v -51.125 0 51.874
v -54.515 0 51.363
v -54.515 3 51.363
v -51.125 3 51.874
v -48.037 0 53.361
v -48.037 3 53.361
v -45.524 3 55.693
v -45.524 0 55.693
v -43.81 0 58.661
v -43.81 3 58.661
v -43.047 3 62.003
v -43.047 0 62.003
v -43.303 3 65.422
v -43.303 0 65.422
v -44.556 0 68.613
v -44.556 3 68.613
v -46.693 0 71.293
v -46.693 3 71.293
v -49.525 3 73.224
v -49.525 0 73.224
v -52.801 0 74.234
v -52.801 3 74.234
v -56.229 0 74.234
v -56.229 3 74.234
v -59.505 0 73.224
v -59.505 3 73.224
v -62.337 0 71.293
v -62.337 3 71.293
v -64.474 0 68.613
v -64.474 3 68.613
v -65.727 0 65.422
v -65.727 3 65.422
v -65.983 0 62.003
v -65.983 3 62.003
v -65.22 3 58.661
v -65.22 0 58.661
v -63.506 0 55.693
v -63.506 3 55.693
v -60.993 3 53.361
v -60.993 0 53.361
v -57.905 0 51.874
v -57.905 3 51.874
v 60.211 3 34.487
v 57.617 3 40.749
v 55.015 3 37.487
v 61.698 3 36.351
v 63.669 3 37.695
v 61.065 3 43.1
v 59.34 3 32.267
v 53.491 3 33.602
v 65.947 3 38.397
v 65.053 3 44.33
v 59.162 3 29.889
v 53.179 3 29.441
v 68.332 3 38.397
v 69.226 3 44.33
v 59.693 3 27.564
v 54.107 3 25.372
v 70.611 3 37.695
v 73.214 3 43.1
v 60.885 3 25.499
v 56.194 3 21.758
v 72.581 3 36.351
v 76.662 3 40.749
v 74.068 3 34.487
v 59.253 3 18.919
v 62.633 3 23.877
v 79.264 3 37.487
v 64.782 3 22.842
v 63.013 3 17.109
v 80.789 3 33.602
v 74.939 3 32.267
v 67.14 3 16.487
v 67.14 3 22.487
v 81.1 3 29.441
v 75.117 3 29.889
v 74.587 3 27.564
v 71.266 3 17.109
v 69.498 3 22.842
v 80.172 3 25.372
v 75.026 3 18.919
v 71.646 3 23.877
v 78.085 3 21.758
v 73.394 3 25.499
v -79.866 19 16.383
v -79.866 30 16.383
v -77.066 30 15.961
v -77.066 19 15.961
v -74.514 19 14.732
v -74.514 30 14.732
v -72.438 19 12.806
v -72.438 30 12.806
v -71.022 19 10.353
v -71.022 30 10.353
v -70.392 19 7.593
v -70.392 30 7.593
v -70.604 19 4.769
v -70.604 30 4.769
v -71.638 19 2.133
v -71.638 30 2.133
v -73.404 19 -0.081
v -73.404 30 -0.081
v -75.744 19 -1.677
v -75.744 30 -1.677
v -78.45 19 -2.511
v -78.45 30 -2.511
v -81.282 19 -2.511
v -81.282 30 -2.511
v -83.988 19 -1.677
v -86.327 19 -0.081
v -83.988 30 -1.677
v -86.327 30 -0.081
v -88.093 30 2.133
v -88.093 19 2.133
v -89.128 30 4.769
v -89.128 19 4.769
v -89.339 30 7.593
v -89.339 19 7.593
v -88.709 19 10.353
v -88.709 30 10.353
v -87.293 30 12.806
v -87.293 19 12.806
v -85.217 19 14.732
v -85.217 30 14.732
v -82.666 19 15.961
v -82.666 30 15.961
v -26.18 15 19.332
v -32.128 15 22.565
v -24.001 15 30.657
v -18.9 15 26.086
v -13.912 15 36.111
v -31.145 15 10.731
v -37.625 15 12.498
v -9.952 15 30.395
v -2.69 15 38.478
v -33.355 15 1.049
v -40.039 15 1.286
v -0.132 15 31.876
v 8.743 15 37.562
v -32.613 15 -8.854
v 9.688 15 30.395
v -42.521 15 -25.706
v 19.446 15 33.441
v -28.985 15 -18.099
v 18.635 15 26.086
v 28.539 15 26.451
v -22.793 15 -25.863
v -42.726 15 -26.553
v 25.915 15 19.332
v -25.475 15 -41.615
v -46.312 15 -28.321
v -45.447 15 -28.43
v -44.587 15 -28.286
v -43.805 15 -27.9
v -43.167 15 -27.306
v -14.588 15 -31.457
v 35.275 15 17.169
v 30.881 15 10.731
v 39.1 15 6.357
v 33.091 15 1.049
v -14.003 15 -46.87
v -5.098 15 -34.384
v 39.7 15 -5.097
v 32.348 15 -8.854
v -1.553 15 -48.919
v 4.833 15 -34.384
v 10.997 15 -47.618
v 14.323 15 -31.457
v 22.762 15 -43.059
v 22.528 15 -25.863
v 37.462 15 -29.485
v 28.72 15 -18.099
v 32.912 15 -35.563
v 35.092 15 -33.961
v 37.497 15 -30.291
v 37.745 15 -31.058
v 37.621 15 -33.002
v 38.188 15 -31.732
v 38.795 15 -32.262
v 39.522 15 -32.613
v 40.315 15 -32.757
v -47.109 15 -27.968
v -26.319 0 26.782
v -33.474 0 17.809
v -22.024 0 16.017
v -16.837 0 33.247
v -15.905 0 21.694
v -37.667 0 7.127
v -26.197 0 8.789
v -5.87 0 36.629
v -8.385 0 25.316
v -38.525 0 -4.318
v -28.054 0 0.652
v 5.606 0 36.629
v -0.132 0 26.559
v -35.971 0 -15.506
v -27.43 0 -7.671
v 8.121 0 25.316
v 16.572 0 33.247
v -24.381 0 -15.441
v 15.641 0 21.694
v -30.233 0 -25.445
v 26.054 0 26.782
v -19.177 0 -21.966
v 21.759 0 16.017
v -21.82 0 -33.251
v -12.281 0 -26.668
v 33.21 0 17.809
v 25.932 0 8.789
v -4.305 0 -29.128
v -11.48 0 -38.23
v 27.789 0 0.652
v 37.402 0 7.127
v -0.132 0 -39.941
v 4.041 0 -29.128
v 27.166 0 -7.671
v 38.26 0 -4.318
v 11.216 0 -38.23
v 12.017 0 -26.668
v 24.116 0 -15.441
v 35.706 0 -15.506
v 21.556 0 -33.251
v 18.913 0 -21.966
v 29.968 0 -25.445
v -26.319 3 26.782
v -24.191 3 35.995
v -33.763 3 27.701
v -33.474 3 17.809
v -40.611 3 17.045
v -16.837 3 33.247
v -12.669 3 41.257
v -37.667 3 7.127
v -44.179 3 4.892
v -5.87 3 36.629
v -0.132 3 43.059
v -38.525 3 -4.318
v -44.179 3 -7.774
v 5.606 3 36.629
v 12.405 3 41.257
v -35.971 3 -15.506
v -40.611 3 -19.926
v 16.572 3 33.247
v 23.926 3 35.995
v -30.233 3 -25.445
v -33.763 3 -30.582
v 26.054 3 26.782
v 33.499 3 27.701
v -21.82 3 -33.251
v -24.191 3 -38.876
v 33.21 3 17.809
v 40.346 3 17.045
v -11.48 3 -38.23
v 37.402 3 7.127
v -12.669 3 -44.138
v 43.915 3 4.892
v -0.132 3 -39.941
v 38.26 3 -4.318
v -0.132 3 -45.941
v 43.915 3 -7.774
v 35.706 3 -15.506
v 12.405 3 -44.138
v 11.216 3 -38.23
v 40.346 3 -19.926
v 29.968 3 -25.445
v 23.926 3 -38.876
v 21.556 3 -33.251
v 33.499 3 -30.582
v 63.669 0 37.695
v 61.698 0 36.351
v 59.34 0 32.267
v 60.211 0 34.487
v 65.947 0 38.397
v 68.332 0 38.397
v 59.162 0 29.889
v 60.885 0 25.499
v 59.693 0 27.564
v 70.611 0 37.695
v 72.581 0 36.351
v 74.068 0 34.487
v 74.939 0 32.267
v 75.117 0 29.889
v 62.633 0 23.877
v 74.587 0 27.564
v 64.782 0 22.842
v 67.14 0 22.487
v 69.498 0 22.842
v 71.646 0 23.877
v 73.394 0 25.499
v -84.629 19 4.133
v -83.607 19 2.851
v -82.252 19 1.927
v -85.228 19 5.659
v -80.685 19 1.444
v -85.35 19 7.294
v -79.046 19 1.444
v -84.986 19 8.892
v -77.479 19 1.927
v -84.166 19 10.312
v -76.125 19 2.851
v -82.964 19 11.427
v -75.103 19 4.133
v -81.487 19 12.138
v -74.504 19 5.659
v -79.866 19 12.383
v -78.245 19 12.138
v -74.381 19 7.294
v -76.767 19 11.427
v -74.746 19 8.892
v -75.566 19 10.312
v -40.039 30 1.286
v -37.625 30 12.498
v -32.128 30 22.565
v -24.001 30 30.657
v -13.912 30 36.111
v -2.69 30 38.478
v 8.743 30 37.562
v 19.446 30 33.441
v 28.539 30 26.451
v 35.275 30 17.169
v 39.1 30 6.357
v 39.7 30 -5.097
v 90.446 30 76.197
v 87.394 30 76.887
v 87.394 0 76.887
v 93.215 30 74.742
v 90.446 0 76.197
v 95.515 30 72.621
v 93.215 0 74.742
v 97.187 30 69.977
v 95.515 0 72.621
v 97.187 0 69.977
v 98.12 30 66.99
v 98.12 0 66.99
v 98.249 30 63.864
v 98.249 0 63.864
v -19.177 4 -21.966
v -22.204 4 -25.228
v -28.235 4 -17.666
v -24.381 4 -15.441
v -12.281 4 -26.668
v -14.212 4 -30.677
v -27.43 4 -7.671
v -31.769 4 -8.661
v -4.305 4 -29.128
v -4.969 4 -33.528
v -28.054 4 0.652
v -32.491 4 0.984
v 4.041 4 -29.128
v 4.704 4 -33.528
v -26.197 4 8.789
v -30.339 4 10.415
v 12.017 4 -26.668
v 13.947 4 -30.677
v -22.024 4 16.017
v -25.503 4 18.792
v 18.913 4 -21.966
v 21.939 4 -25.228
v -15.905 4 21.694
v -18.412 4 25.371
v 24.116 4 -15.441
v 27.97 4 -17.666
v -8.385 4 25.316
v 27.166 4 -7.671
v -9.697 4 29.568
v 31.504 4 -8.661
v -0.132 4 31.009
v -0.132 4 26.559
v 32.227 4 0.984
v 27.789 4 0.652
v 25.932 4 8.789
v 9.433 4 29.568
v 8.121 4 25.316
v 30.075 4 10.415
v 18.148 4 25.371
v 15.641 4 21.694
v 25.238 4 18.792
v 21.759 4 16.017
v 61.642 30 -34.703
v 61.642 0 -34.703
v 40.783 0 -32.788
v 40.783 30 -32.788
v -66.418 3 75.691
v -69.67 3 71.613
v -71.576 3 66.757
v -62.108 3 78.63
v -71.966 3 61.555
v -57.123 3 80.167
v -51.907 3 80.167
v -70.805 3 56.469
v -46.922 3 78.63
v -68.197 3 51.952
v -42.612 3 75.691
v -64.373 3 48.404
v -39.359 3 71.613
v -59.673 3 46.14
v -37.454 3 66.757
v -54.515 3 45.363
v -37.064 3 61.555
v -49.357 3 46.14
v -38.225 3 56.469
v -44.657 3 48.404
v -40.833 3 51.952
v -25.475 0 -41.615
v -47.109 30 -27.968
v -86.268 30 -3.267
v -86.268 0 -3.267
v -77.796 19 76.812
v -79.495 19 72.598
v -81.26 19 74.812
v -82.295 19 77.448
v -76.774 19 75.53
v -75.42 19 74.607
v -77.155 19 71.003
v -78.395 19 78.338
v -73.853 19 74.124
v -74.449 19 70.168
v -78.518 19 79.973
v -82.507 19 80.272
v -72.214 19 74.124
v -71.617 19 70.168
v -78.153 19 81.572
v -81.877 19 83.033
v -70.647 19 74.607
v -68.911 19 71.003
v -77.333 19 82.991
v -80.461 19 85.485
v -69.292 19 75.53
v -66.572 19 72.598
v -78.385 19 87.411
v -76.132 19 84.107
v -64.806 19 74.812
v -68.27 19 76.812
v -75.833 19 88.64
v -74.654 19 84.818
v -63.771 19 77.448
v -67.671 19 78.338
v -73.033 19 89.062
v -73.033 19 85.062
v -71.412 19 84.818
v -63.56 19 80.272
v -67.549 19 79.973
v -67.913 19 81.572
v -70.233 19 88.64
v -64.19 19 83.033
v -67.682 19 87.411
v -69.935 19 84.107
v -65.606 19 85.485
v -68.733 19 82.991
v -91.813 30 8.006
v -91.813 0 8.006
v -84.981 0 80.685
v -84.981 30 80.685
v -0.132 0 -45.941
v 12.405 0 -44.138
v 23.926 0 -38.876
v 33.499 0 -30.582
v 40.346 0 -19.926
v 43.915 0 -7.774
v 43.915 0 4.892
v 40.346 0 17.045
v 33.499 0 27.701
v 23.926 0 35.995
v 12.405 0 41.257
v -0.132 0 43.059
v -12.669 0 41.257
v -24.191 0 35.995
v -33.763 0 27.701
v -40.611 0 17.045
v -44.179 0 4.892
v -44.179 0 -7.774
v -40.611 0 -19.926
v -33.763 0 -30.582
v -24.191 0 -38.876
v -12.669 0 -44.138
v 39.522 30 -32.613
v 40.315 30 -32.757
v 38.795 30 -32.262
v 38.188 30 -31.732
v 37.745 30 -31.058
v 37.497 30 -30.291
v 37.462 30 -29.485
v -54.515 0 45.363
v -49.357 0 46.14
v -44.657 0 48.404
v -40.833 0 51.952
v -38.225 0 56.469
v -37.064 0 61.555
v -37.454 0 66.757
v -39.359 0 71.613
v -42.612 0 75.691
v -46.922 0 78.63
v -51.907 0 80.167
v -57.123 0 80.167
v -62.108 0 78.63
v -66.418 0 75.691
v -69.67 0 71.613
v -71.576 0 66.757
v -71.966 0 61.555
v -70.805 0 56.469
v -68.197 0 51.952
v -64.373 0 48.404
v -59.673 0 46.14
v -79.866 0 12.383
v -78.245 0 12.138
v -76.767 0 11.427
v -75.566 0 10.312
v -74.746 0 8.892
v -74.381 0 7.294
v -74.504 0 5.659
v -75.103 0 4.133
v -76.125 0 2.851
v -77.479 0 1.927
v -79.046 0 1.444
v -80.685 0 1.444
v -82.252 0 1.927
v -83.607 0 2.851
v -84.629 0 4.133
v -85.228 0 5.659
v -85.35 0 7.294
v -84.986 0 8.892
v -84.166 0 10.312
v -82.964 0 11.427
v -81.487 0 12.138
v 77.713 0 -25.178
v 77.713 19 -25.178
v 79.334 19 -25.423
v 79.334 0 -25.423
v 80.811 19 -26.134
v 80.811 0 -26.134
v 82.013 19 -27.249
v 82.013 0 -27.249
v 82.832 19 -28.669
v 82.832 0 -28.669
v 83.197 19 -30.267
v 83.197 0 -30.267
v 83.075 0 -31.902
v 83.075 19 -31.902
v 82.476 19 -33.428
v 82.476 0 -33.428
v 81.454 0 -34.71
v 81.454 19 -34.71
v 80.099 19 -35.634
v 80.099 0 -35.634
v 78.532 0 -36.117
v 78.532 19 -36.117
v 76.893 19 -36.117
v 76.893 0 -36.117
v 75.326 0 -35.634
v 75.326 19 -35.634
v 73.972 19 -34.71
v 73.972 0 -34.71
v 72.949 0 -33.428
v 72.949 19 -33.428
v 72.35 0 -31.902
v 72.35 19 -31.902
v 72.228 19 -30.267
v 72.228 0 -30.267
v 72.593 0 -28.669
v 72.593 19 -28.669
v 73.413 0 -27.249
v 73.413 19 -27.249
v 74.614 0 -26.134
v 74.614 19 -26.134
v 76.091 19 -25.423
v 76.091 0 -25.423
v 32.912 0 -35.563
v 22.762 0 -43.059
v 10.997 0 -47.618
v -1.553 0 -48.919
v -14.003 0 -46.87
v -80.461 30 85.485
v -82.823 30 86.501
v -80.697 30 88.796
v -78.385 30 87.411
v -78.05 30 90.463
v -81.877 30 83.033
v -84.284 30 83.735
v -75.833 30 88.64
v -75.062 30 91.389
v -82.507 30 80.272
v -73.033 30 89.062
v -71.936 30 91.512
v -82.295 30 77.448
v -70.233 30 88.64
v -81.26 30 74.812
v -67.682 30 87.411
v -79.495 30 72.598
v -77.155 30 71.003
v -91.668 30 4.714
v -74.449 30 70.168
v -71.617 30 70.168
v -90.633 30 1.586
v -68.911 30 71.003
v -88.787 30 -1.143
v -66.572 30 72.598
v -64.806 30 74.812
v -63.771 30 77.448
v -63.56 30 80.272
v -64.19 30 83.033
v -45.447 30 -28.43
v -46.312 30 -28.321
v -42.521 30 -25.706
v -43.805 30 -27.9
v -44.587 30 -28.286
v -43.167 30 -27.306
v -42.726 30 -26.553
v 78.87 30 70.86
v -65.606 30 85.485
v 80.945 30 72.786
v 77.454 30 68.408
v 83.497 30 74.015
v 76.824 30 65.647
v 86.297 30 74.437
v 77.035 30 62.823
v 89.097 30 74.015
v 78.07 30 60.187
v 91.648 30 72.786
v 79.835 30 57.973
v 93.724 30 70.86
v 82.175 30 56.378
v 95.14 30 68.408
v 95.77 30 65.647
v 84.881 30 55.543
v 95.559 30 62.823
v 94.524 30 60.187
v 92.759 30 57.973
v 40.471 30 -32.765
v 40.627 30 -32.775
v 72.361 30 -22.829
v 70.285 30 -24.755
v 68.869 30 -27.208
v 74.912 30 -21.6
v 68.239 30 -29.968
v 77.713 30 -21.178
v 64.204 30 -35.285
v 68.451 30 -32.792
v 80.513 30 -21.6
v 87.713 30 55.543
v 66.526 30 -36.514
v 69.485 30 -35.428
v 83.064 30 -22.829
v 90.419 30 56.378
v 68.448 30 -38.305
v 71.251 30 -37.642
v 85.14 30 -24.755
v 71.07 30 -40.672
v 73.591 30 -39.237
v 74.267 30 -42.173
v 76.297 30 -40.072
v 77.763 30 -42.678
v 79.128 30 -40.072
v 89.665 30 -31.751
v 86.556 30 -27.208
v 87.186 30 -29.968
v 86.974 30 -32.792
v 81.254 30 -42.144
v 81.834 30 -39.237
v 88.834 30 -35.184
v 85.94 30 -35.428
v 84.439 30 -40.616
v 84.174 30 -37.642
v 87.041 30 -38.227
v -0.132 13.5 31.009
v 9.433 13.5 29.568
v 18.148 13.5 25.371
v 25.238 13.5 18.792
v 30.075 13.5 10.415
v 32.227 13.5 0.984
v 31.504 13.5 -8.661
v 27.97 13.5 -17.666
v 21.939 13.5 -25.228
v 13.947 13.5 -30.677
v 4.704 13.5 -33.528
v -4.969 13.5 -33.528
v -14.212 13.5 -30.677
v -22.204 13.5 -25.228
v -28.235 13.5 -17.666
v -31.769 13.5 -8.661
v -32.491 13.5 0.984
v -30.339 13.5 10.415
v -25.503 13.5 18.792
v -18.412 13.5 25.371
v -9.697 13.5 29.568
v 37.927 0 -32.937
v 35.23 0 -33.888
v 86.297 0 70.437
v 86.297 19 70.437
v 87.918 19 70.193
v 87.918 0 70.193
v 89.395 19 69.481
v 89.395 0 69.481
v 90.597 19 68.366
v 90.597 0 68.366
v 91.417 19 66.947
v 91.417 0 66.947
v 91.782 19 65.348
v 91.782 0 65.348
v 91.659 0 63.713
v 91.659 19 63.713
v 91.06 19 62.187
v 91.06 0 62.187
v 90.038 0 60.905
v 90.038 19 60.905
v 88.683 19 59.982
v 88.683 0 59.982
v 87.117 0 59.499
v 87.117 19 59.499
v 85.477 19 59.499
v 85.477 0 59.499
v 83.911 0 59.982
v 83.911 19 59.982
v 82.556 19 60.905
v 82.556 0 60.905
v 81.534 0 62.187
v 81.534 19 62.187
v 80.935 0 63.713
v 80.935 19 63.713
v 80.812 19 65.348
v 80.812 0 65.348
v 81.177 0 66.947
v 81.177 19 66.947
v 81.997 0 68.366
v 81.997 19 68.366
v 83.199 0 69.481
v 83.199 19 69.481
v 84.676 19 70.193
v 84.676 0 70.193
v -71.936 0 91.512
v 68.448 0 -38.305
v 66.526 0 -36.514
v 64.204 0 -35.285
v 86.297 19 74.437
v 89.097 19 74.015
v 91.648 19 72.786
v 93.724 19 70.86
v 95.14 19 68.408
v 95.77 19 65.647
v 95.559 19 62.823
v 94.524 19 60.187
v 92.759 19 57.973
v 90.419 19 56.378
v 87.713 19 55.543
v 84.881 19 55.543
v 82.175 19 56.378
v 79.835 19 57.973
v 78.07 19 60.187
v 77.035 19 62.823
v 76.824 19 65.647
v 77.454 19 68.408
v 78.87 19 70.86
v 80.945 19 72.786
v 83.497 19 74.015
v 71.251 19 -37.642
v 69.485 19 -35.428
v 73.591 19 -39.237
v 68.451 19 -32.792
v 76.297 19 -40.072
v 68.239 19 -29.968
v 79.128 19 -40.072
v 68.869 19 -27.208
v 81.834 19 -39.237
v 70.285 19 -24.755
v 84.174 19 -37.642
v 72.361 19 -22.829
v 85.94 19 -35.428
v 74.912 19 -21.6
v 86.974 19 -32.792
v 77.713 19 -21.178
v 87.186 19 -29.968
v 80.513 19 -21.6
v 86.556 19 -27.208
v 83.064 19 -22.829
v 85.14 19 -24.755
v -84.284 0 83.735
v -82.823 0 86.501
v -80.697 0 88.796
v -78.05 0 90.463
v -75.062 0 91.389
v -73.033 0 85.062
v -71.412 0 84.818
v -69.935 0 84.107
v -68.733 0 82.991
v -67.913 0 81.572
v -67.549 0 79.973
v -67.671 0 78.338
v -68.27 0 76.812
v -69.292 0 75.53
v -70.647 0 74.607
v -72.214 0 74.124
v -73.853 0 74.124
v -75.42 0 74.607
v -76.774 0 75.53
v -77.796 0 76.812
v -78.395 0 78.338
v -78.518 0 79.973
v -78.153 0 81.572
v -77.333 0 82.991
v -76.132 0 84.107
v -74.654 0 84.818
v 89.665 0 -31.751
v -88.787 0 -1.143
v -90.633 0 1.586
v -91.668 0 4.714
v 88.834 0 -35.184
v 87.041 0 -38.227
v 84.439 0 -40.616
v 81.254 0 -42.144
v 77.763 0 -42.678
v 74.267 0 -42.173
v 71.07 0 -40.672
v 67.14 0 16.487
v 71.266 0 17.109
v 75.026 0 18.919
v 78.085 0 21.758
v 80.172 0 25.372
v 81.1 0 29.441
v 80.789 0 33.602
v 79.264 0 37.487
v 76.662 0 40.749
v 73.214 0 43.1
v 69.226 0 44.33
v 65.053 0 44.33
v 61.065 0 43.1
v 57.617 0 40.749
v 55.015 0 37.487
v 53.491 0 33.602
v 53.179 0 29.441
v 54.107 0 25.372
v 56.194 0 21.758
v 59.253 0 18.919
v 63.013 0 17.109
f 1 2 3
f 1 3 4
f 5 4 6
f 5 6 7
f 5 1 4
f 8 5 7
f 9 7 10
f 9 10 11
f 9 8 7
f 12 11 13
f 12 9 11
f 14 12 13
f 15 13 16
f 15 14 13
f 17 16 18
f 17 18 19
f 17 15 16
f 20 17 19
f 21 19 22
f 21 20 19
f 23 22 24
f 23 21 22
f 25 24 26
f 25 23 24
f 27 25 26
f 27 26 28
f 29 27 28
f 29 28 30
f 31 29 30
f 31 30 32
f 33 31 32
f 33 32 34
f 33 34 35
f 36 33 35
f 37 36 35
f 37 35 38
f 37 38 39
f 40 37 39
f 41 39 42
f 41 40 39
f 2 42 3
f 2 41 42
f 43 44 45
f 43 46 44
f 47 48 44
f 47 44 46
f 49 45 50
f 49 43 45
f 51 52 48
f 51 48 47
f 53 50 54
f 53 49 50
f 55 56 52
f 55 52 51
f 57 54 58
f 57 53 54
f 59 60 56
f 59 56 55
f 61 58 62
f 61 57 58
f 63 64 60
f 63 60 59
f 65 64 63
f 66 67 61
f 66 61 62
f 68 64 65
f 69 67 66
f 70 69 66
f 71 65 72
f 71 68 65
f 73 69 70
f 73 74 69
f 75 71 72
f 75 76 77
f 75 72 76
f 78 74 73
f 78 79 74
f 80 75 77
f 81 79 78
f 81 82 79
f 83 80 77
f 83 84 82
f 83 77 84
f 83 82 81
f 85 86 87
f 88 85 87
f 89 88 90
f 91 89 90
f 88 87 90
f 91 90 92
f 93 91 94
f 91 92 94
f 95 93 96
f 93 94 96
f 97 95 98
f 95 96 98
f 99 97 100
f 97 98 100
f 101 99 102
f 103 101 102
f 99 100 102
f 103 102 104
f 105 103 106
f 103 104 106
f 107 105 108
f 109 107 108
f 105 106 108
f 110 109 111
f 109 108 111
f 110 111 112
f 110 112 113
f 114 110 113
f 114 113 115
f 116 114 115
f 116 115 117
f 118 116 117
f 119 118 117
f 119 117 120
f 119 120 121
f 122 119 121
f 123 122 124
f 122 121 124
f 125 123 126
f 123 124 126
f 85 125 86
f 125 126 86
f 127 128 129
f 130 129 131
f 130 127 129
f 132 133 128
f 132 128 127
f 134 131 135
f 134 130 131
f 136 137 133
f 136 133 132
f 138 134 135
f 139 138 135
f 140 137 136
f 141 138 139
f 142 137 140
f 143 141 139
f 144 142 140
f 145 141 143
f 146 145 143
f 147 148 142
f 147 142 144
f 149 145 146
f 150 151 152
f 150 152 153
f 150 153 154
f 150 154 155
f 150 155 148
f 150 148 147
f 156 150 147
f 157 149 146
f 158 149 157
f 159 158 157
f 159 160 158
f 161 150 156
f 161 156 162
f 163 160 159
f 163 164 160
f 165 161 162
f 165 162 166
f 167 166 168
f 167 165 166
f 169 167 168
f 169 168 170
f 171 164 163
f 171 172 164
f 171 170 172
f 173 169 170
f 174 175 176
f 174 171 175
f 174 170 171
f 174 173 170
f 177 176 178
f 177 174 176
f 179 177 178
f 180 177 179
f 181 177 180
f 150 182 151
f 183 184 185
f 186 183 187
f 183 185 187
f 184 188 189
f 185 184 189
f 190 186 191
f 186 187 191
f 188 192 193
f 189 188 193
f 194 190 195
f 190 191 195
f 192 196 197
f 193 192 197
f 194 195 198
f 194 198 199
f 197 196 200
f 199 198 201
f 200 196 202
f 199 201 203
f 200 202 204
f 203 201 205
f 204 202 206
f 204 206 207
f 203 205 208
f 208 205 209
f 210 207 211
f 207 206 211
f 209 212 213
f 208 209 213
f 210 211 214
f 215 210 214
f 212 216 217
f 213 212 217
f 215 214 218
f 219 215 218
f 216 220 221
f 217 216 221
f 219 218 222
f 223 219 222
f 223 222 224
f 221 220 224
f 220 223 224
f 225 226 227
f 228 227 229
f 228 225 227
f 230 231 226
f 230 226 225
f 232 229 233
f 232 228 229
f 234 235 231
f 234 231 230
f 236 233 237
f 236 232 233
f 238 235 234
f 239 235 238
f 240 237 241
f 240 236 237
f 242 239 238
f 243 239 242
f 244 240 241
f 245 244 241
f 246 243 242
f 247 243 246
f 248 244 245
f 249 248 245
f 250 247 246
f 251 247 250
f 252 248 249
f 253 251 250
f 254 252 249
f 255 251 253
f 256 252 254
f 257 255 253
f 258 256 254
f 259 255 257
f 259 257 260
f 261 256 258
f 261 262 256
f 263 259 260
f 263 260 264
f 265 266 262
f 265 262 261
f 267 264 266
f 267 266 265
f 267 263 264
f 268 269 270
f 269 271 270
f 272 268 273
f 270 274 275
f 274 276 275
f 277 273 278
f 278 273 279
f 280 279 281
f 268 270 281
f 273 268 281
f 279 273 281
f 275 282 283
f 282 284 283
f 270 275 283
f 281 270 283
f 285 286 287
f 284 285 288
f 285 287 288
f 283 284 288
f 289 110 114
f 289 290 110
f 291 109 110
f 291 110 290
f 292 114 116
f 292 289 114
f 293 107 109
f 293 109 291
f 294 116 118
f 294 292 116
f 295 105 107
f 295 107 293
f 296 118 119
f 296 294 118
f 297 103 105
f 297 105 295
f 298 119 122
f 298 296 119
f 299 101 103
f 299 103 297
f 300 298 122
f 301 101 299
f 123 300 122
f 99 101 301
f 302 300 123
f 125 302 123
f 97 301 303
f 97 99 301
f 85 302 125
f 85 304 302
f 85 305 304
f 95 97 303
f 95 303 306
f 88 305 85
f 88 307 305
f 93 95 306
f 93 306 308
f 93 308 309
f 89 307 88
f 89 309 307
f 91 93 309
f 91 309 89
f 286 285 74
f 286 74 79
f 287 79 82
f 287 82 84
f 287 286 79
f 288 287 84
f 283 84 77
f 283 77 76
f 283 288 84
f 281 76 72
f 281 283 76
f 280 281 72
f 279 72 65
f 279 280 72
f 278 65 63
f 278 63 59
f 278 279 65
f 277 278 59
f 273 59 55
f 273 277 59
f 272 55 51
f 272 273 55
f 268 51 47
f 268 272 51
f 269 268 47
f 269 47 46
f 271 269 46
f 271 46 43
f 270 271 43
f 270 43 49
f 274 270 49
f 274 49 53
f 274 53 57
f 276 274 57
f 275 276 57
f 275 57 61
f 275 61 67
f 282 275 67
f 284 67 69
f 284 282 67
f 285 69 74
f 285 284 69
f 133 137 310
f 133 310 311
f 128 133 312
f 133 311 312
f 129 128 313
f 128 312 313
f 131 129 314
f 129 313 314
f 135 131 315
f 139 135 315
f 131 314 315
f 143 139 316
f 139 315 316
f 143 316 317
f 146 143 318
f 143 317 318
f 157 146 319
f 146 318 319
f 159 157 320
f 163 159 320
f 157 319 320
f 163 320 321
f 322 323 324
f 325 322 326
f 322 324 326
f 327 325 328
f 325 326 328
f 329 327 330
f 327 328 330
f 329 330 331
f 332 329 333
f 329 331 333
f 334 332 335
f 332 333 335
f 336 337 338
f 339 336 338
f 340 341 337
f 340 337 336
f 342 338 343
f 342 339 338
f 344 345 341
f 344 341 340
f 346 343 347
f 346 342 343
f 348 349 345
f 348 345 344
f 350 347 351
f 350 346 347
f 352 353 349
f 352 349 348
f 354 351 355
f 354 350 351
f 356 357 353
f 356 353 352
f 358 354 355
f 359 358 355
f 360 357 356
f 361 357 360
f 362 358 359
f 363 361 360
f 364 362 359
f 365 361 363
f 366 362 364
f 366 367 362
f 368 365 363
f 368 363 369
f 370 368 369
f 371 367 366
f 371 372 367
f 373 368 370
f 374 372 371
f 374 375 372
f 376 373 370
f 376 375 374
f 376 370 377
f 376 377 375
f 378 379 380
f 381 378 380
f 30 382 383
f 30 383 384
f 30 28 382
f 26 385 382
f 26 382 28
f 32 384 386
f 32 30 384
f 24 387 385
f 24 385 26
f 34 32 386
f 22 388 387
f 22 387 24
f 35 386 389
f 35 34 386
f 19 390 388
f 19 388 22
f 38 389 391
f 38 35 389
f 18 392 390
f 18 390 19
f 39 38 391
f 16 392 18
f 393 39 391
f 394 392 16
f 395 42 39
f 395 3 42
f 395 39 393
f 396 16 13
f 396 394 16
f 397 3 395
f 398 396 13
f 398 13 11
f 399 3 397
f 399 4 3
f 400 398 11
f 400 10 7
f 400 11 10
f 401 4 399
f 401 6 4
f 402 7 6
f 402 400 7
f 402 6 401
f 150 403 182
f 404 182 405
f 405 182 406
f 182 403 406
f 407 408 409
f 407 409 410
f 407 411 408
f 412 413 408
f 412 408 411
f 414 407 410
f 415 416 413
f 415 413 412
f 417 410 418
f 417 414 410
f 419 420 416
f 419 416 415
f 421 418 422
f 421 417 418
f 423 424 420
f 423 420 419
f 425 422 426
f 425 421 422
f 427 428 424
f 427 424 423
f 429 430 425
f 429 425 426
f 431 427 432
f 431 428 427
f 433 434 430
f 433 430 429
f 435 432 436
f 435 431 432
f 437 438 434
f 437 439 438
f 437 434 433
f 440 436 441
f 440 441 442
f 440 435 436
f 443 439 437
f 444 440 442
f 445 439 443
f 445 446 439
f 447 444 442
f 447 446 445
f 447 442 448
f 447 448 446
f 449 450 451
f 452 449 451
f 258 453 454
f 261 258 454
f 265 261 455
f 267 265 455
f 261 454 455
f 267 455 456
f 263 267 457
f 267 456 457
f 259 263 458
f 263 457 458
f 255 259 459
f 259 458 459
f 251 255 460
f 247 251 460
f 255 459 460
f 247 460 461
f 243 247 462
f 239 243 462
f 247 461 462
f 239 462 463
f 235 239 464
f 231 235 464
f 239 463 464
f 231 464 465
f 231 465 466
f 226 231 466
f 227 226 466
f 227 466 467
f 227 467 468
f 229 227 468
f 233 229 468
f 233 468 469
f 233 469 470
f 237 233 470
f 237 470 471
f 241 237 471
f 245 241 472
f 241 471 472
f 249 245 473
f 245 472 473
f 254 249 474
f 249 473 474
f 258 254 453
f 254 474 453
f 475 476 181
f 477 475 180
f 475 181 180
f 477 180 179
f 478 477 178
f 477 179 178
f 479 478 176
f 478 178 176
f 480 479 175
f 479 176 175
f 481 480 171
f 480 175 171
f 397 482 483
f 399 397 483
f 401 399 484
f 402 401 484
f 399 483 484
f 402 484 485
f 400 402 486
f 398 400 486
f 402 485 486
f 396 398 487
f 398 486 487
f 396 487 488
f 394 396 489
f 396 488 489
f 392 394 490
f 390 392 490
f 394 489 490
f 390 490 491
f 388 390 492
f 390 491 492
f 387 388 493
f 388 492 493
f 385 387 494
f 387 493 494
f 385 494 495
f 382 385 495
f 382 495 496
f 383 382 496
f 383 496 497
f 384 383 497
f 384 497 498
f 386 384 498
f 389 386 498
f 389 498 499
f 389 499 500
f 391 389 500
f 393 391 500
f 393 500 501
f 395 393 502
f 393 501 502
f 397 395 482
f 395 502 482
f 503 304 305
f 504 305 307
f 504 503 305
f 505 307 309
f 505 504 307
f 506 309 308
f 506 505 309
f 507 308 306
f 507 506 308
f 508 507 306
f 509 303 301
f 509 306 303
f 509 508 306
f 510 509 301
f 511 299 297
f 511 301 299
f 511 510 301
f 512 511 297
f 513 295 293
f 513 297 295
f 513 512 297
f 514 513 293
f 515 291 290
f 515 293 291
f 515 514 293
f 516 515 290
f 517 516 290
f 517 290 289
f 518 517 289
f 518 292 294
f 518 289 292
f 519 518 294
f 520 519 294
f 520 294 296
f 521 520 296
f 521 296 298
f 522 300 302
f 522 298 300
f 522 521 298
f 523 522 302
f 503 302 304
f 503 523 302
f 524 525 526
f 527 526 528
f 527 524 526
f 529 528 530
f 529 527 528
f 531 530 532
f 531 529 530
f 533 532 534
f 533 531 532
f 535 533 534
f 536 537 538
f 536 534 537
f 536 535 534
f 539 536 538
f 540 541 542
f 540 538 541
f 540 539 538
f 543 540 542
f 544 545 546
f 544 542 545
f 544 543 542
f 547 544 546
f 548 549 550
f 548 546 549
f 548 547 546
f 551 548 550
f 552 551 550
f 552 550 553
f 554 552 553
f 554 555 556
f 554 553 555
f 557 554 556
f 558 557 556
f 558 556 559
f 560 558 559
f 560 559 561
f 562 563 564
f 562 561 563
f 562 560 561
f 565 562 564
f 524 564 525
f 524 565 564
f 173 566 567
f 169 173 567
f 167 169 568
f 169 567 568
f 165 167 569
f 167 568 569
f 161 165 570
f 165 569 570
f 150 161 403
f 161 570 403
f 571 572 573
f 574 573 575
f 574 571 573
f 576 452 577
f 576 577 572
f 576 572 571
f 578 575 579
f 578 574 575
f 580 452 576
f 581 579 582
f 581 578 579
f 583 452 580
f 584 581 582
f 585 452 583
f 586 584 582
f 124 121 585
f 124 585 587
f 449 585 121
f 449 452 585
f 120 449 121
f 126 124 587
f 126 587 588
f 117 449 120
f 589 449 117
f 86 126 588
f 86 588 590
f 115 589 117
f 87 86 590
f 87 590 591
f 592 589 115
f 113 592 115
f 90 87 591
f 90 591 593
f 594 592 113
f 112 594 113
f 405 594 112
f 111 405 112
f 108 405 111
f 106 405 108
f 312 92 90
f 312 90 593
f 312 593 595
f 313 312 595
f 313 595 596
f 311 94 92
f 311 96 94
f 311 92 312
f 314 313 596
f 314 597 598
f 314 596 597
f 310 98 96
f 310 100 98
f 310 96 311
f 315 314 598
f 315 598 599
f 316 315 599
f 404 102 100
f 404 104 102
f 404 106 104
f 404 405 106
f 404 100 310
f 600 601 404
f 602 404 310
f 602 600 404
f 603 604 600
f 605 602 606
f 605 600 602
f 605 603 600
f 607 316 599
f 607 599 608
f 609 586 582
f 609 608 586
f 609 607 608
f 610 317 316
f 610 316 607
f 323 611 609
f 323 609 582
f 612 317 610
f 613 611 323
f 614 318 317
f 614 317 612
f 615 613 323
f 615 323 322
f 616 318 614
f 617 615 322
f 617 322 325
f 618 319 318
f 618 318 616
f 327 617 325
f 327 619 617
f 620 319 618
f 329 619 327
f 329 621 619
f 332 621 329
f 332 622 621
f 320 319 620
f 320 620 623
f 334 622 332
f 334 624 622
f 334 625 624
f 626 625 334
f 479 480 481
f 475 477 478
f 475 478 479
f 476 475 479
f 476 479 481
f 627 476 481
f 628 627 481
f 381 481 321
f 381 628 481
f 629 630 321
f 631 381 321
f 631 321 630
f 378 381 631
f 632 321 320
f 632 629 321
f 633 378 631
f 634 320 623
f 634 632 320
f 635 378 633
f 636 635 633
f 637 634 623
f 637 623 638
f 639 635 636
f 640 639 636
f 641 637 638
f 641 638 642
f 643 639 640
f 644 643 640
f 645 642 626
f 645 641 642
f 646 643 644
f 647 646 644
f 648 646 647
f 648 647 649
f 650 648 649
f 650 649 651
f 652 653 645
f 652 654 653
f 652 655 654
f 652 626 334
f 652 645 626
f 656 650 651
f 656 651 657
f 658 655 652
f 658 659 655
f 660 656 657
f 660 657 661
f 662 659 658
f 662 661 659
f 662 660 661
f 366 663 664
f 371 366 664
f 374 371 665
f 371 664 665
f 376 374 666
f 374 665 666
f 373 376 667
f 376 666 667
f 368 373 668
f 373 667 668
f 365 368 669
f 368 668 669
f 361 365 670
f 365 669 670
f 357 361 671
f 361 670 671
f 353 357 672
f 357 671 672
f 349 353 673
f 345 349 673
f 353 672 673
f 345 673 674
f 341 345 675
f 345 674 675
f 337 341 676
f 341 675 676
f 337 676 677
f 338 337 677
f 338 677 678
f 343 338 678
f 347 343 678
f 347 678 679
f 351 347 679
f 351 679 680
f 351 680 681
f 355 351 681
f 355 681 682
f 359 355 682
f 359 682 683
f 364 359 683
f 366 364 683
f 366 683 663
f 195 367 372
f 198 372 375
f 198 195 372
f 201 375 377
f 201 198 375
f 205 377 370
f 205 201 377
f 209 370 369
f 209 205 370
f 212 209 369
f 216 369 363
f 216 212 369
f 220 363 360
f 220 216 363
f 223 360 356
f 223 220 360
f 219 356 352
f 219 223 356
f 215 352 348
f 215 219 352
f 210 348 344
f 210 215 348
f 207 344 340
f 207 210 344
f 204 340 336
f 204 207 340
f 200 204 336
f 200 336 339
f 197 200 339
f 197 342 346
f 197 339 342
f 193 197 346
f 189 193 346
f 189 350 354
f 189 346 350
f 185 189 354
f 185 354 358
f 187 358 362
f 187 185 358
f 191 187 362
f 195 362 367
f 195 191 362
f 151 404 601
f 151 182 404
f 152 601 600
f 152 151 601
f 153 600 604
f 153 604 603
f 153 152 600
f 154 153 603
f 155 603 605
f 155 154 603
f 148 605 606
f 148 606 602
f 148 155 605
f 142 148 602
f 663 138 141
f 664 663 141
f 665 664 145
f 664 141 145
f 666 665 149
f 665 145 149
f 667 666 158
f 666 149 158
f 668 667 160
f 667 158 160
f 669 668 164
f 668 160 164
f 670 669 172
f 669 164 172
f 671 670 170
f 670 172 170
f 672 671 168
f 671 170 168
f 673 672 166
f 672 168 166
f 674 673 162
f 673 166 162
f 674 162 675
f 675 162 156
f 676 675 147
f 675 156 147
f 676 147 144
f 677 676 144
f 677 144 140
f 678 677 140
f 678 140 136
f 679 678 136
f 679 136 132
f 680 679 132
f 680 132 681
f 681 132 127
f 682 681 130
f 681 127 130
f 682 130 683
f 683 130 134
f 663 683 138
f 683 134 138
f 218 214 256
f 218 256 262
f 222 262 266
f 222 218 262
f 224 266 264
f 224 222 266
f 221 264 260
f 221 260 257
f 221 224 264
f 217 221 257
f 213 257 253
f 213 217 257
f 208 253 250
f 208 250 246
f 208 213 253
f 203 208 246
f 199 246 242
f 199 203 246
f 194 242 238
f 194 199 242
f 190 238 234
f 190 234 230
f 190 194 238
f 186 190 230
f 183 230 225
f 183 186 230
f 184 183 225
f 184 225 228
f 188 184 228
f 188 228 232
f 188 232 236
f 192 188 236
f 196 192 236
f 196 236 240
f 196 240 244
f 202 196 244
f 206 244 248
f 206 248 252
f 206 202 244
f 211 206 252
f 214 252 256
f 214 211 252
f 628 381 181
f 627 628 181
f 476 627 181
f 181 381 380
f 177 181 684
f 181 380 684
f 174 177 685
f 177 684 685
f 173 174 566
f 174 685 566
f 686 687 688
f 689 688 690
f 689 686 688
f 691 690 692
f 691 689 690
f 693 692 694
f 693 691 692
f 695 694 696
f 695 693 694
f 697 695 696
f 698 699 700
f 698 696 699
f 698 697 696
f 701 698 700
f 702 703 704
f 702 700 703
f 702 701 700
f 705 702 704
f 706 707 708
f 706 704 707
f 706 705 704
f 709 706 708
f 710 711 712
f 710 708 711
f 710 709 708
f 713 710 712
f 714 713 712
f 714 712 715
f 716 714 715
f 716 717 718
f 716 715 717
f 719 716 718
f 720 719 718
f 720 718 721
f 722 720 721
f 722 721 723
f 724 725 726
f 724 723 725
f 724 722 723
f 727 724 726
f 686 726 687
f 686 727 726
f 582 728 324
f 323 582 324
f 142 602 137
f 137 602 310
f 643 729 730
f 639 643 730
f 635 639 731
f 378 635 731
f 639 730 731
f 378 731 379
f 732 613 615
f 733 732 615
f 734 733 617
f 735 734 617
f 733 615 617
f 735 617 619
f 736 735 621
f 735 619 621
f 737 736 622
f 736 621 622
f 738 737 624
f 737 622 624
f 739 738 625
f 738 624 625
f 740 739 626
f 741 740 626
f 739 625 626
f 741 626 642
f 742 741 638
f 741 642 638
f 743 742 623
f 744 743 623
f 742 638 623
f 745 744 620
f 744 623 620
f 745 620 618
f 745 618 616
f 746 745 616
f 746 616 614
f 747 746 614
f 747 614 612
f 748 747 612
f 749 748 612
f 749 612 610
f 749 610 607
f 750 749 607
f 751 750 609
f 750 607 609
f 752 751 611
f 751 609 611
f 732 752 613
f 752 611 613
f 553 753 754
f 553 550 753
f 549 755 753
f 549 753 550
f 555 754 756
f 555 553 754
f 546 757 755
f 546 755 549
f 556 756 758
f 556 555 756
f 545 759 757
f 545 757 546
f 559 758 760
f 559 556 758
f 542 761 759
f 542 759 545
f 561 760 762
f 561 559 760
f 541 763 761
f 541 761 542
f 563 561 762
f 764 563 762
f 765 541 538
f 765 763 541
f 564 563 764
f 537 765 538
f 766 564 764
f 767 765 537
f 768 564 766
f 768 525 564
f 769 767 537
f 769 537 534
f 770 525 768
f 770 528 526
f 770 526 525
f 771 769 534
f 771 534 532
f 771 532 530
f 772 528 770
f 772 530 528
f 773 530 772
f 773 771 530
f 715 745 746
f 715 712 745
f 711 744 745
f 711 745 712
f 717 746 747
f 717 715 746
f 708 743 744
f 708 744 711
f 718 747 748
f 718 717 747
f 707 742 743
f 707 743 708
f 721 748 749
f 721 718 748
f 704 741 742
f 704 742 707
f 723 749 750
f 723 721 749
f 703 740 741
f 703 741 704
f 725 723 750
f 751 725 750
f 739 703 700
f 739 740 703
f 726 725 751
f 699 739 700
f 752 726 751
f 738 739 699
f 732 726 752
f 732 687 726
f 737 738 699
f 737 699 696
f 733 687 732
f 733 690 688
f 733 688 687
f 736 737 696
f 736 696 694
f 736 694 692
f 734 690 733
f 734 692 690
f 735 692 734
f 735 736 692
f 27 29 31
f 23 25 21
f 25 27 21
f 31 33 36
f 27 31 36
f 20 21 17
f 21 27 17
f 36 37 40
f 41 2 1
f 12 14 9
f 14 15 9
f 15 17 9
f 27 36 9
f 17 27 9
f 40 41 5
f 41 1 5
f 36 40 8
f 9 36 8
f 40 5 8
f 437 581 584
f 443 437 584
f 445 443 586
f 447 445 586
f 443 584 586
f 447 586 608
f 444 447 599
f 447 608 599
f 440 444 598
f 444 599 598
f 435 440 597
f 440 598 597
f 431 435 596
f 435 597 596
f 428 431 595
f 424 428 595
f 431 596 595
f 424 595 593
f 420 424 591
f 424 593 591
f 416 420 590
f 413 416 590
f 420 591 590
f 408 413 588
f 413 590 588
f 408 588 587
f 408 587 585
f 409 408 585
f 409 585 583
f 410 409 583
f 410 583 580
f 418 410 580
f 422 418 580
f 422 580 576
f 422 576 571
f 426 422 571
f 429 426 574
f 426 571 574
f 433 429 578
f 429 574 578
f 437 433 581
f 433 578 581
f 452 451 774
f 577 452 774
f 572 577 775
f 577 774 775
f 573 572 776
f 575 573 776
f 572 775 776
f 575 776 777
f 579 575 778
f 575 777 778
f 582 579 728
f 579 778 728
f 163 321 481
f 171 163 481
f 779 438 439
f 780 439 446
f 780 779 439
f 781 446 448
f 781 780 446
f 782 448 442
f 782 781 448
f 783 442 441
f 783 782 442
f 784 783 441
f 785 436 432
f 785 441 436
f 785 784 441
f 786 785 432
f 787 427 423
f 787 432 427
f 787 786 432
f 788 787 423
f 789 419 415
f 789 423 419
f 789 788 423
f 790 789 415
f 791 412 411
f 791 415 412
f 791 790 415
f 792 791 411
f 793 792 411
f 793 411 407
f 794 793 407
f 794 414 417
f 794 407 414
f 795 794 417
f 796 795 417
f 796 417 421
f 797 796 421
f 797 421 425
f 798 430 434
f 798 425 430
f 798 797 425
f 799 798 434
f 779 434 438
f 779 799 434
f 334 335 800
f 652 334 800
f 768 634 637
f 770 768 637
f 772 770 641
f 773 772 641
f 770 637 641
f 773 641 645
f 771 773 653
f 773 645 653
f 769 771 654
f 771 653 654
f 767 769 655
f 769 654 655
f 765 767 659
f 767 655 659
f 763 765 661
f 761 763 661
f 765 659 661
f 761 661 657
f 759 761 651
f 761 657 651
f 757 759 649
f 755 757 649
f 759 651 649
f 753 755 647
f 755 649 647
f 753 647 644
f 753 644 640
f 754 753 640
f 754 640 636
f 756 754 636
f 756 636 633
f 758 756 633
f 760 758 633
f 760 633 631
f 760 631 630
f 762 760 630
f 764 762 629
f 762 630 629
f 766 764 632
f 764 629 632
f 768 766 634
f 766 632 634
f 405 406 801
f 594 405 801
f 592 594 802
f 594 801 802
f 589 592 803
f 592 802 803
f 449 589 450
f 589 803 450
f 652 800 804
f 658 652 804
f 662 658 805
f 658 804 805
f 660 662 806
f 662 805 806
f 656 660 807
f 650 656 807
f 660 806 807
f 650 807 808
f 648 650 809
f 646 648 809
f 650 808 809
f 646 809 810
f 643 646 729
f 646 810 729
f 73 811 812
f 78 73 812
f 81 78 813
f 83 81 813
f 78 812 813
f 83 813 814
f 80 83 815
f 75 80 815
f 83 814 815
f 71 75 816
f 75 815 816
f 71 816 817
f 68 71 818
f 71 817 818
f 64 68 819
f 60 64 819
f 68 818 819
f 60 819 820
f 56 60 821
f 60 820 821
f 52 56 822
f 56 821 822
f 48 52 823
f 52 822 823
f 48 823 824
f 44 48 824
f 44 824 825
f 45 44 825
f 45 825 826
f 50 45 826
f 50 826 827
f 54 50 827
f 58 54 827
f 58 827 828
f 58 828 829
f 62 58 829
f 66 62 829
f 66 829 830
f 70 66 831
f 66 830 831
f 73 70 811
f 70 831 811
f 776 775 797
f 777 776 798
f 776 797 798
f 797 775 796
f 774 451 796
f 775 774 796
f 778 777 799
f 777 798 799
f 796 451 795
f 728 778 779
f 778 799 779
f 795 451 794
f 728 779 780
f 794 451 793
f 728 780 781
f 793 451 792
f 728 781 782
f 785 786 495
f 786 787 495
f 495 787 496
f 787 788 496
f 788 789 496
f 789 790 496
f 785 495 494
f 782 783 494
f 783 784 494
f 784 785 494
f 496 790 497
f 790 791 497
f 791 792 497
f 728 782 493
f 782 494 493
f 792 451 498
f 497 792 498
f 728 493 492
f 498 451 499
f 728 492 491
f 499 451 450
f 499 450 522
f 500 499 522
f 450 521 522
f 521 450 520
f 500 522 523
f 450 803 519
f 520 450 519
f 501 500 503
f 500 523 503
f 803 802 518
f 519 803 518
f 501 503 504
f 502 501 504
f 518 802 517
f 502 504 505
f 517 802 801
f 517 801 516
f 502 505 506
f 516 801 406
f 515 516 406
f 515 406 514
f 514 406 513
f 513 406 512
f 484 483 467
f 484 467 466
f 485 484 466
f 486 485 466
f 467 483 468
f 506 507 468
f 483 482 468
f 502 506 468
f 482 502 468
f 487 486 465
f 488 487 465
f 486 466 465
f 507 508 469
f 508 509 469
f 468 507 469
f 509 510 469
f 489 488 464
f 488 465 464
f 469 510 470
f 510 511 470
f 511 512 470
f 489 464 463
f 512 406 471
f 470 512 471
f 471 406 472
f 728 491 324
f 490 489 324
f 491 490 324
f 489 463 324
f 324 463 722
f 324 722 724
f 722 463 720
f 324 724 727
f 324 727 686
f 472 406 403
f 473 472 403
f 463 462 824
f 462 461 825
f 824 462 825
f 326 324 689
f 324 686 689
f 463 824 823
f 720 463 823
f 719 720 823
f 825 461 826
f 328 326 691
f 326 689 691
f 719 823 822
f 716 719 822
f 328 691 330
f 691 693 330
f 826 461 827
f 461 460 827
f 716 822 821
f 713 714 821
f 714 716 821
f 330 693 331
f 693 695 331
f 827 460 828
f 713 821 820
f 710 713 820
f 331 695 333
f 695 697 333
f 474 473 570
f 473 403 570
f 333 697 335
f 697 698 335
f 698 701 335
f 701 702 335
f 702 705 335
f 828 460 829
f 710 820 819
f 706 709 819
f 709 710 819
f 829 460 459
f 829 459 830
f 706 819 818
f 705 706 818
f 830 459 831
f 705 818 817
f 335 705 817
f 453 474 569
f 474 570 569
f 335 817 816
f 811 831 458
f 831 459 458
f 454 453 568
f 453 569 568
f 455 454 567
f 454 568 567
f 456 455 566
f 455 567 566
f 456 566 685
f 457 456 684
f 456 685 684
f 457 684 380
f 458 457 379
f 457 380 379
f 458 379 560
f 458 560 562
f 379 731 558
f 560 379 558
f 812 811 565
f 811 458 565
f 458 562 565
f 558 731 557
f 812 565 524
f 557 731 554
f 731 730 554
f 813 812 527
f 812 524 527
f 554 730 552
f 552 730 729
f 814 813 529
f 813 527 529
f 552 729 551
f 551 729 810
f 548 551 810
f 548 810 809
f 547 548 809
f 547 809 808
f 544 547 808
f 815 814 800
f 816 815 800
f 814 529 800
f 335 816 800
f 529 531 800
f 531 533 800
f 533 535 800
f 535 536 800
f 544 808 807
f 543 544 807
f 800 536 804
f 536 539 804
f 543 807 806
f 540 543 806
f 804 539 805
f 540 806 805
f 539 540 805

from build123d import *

# Parameters (mm, degrees)
SKETCH7_R               = 5.5
SKETCH7_R_2             = 28
MAIN_BODY_DEPTH         = 30
BOLT_HEAD_COUNTERSINK_R = 9.5
COUNTERSINK_HOLES_DEPTH = 11
SKETCH9_R               = 32.45
CUT_EXTRUDE2_DEPTH      = 26
CUT_EXTRUDE3_DEPTH      = 15
ROUND_EDGES_R           = 3
F_30_CHAMFER1_SIZE      = 1.5
F_30_CHAMFER1_SIZE2     = 0.866025404
SKETCH11_R              = 44.5
SKETCH11_R_2            = 38.5
SKETCH11_R_3            = 17.5
SKETCH11_R_4            = 11.5
SKETCH11_R_5            = 14
SKETCH11_R_6            = 8
CUT_EXTRUDE4_DEPTH      = 3


with BuildPart() as part:
    # Sketch7 → Main body (new body)
    with BuildSketch(Plane(origin=(0, 0, 0), x_dir=(1, 0, 0), z_dir=(0, 1, 0))):
        with BuildLine():
            Line((-91.813057025, -8.005811355), (-84.980564836, -80.685361783))
            ThreePointArc((-84.980564836, -80.685361783), (-80.697244338, -88.79601226), (-71.936363988, -91.511976387))
            Line((-71.936363988, -91.511976387), (87.393822743, -76.886943186))
            ThreePointArc((87.393822743, -76.886943186), (95.514657683, -72.620523346), (98.248872823, -63.864133341))
            Line((98.248872823, -63.864133341), (89.6645061, 31.751287215))
            ThreePointArc((89.6645061, 31.751287215), (81.254432476, 42.143635856), (68.448272489, 38.305340008))
            ThreePointArc((68.448272489, 38.305340008), (65.405823358, 35.822809296), (61.642082029, 34.703118865))
            Line((61.642082029, 34.703118865), (40.782608291, 32.788412667))
            ThreePointArc((40.782608291, 32.788412667), (36.543989689, 33.315359566), (32.911888119, 35.562891293))
            ThreePointArc((32.911888119, 35.562891293), (4.765471685, 48.687341482), (-25.474547855, 41.615342543))
            Line((-25.474547855, 41.615342543), (-86.26800446, 3.266768015))
            ThreePointArc((-86.26800446, 3.266768015), (-90.633494009, -1.585933038), (-91.813057025, -8.005811355))
        make_face()
        with Locations(Location((77.712578531, 30.678241374, 0), (0, 0, 270))):
            Circle(SKETCH7_R, mode=Mode.SUBTRACT)
        with Locations(Location((-79.865733667, -6.882661954, 0), (0, 0, 270))):
            Circle(SKETCH7_R, mode=Mode.SUBTRACT)
        with Locations(Location((86.296945253, -64.937179181, 0), (0, 0, 270))):
            Circle(SKETCH7_R, mode=Mode.SUBTRACT)
        with Locations(Location((-73.033241478, -79.562212382, 0), (0, 0, 270))):
            Circle(SKETCH7_R, mode=Mode.SUBTRACT)
        with Locations(Location((-0.132225968, 1.440515582, 0), (0, 0, 270))):
            Circle(SKETCH7_R_2, mode=Mode.SUBTRACT)
    extrude(amount=MAIN_BODY_DEPTH)

    # bolt head countersink → countersink holes (cut)
    with BuildSketch(Plane(origin=(0, 30, 0), x_dir=(1, 0, 0), z_dir=(0, 1, 0))):
        with Locations(Location((-79.865733667, -6.882661954, 0), (0, 0, 270))):
            Circle(BOLT_HEAD_COUNTERSINK_R)
        with Locations(Location((-73.033241478, -79.562212382, 0), (0, 0, 270))):
            Circle(BOLT_HEAD_COUNTERSINK_R)
        with Locations(Location((77.712578531, 30.678241374, 0), (0, 0, 270))):
            Circle(BOLT_HEAD_COUNTERSINK_R)
        with Locations(Location((86.296945253, -64.937179181, 0), (0, 0, 270))):
            Circle(BOLT_HEAD_COUNTERSINK_R)
    extrude(amount=-COUNTERSINK_HOLES_DEPTH, mode=Mode.SUBTRACT)

    # Sketch9 → Cut-Extrude2 (cut)
    with BuildSketch(Plane(origin=(0, 30, 0), x_dir=(1, 0, 0), z_dir=(0, 1, 0))):
        with Locations(Location((-0.132225968, 1.440515582, 0), (0, 0, 270))):
            Circle(SKETCH9_R)
    extrude(amount=-CUT_EXTRUDE2_DEPTH, mode=Mode.SUBTRACT)

    # Sketch10 → Cut-Extrude3 (cut)
    with BuildSketch(Plane(origin=(0, 30, 0), x_dir=(1, 0, 0), z_dir=(0, 1, 0))):
        with BuildLine():
            Line((-46.230998709, 66.050698395), (-40.039175854, -1.286268383))
            ThreePointArc((-40.039175854, -1.286268383), (3.059511975, -38.431941189), (39.700320715, 5.096773882))
            Line((39.700320715, 5.096773882), (33.434094657, 73.363214995))
            Line((33.434094657, 73.363214995), (-46.230998709, 66.050698395))
        make_face()
    extrude(amount=-CUT_EXTRUDE3_DEPTH, mode=Mode.SUBTRACT)

    # round edges
    round_edges_edges = [part.edges().sort_by_distance(p)[0] for p in [
        (-42.96933308, 22.5, -30.579614152),
        (37.127163098, 22.5, -33.12964587),
    ]]
    fillet(round_edges_edges, radius=ROUND_EDGES_R)

    # 30 Chamfer1
    f_30_chamfer1_edges = [part.edges().sort_by_distance(p)[0] for p in [
        (-0.132225968, 15, -33.890515582),
    ]]
    f_30_chamfer1_side = [part.faces().sort_by_distance(p)[0] for p in [
        (-0.132225968, 9.5, -33.890515582),
    ]]
    chamfer(f_30_chamfer1_edges, length=F_30_CHAMFER1_SIZE, length2=F_30_CHAMFER1_SIZE2, reference=f_30_chamfer1_side[0])

    # Sketch11 → Cut-Extrude4 (cut)
    # profile 1 of 3: a face of its own
    with BuildSketch(Plane.XZ):
        with Locations(Location((-0.132225968, -1.440515582, 0), (0, 0, 270))):
            Circle(SKETCH11_R)
        with Locations(Location((-0.132225968, -1.440515582, 0), (0, 0, 270))):
            Circle(SKETCH11_R_2, mode=Mode.SUBTRACT)
    # profile 2 of 3: a face of its own
    with BuildSketch(Plane.XZ):
        with Locations(Location((-54.514942776, 62.86283352, 0), (0, 0, 270))):
            Circle(SKETCH11_R_3)
        with Locations(Location((-54.514942776, 62.86283352, 0), (0, 0, 270))):
            Circle(SKETCH11_R_4, mode=Mode.SUBTRACT)
    # profile 3 of 3: a face of its own
    with BuildSketch(Plane.XZ):
        with Locations(Location((67.139628144, 30.48677163, 0), (0, 0, 270))):
            Circle(SKETCH11_R_5)
        with Locations(Location((67.139628144, 30.48677163, 0), (0, 0, 270))):
            Circle(SKETCH11_R_6, mode=Mode.SUBTRACT)
    extrude(amount=-CUT_EXTRUDE4_DEPTH, mode=Mode.SUBTRACT)


solid = part.part
